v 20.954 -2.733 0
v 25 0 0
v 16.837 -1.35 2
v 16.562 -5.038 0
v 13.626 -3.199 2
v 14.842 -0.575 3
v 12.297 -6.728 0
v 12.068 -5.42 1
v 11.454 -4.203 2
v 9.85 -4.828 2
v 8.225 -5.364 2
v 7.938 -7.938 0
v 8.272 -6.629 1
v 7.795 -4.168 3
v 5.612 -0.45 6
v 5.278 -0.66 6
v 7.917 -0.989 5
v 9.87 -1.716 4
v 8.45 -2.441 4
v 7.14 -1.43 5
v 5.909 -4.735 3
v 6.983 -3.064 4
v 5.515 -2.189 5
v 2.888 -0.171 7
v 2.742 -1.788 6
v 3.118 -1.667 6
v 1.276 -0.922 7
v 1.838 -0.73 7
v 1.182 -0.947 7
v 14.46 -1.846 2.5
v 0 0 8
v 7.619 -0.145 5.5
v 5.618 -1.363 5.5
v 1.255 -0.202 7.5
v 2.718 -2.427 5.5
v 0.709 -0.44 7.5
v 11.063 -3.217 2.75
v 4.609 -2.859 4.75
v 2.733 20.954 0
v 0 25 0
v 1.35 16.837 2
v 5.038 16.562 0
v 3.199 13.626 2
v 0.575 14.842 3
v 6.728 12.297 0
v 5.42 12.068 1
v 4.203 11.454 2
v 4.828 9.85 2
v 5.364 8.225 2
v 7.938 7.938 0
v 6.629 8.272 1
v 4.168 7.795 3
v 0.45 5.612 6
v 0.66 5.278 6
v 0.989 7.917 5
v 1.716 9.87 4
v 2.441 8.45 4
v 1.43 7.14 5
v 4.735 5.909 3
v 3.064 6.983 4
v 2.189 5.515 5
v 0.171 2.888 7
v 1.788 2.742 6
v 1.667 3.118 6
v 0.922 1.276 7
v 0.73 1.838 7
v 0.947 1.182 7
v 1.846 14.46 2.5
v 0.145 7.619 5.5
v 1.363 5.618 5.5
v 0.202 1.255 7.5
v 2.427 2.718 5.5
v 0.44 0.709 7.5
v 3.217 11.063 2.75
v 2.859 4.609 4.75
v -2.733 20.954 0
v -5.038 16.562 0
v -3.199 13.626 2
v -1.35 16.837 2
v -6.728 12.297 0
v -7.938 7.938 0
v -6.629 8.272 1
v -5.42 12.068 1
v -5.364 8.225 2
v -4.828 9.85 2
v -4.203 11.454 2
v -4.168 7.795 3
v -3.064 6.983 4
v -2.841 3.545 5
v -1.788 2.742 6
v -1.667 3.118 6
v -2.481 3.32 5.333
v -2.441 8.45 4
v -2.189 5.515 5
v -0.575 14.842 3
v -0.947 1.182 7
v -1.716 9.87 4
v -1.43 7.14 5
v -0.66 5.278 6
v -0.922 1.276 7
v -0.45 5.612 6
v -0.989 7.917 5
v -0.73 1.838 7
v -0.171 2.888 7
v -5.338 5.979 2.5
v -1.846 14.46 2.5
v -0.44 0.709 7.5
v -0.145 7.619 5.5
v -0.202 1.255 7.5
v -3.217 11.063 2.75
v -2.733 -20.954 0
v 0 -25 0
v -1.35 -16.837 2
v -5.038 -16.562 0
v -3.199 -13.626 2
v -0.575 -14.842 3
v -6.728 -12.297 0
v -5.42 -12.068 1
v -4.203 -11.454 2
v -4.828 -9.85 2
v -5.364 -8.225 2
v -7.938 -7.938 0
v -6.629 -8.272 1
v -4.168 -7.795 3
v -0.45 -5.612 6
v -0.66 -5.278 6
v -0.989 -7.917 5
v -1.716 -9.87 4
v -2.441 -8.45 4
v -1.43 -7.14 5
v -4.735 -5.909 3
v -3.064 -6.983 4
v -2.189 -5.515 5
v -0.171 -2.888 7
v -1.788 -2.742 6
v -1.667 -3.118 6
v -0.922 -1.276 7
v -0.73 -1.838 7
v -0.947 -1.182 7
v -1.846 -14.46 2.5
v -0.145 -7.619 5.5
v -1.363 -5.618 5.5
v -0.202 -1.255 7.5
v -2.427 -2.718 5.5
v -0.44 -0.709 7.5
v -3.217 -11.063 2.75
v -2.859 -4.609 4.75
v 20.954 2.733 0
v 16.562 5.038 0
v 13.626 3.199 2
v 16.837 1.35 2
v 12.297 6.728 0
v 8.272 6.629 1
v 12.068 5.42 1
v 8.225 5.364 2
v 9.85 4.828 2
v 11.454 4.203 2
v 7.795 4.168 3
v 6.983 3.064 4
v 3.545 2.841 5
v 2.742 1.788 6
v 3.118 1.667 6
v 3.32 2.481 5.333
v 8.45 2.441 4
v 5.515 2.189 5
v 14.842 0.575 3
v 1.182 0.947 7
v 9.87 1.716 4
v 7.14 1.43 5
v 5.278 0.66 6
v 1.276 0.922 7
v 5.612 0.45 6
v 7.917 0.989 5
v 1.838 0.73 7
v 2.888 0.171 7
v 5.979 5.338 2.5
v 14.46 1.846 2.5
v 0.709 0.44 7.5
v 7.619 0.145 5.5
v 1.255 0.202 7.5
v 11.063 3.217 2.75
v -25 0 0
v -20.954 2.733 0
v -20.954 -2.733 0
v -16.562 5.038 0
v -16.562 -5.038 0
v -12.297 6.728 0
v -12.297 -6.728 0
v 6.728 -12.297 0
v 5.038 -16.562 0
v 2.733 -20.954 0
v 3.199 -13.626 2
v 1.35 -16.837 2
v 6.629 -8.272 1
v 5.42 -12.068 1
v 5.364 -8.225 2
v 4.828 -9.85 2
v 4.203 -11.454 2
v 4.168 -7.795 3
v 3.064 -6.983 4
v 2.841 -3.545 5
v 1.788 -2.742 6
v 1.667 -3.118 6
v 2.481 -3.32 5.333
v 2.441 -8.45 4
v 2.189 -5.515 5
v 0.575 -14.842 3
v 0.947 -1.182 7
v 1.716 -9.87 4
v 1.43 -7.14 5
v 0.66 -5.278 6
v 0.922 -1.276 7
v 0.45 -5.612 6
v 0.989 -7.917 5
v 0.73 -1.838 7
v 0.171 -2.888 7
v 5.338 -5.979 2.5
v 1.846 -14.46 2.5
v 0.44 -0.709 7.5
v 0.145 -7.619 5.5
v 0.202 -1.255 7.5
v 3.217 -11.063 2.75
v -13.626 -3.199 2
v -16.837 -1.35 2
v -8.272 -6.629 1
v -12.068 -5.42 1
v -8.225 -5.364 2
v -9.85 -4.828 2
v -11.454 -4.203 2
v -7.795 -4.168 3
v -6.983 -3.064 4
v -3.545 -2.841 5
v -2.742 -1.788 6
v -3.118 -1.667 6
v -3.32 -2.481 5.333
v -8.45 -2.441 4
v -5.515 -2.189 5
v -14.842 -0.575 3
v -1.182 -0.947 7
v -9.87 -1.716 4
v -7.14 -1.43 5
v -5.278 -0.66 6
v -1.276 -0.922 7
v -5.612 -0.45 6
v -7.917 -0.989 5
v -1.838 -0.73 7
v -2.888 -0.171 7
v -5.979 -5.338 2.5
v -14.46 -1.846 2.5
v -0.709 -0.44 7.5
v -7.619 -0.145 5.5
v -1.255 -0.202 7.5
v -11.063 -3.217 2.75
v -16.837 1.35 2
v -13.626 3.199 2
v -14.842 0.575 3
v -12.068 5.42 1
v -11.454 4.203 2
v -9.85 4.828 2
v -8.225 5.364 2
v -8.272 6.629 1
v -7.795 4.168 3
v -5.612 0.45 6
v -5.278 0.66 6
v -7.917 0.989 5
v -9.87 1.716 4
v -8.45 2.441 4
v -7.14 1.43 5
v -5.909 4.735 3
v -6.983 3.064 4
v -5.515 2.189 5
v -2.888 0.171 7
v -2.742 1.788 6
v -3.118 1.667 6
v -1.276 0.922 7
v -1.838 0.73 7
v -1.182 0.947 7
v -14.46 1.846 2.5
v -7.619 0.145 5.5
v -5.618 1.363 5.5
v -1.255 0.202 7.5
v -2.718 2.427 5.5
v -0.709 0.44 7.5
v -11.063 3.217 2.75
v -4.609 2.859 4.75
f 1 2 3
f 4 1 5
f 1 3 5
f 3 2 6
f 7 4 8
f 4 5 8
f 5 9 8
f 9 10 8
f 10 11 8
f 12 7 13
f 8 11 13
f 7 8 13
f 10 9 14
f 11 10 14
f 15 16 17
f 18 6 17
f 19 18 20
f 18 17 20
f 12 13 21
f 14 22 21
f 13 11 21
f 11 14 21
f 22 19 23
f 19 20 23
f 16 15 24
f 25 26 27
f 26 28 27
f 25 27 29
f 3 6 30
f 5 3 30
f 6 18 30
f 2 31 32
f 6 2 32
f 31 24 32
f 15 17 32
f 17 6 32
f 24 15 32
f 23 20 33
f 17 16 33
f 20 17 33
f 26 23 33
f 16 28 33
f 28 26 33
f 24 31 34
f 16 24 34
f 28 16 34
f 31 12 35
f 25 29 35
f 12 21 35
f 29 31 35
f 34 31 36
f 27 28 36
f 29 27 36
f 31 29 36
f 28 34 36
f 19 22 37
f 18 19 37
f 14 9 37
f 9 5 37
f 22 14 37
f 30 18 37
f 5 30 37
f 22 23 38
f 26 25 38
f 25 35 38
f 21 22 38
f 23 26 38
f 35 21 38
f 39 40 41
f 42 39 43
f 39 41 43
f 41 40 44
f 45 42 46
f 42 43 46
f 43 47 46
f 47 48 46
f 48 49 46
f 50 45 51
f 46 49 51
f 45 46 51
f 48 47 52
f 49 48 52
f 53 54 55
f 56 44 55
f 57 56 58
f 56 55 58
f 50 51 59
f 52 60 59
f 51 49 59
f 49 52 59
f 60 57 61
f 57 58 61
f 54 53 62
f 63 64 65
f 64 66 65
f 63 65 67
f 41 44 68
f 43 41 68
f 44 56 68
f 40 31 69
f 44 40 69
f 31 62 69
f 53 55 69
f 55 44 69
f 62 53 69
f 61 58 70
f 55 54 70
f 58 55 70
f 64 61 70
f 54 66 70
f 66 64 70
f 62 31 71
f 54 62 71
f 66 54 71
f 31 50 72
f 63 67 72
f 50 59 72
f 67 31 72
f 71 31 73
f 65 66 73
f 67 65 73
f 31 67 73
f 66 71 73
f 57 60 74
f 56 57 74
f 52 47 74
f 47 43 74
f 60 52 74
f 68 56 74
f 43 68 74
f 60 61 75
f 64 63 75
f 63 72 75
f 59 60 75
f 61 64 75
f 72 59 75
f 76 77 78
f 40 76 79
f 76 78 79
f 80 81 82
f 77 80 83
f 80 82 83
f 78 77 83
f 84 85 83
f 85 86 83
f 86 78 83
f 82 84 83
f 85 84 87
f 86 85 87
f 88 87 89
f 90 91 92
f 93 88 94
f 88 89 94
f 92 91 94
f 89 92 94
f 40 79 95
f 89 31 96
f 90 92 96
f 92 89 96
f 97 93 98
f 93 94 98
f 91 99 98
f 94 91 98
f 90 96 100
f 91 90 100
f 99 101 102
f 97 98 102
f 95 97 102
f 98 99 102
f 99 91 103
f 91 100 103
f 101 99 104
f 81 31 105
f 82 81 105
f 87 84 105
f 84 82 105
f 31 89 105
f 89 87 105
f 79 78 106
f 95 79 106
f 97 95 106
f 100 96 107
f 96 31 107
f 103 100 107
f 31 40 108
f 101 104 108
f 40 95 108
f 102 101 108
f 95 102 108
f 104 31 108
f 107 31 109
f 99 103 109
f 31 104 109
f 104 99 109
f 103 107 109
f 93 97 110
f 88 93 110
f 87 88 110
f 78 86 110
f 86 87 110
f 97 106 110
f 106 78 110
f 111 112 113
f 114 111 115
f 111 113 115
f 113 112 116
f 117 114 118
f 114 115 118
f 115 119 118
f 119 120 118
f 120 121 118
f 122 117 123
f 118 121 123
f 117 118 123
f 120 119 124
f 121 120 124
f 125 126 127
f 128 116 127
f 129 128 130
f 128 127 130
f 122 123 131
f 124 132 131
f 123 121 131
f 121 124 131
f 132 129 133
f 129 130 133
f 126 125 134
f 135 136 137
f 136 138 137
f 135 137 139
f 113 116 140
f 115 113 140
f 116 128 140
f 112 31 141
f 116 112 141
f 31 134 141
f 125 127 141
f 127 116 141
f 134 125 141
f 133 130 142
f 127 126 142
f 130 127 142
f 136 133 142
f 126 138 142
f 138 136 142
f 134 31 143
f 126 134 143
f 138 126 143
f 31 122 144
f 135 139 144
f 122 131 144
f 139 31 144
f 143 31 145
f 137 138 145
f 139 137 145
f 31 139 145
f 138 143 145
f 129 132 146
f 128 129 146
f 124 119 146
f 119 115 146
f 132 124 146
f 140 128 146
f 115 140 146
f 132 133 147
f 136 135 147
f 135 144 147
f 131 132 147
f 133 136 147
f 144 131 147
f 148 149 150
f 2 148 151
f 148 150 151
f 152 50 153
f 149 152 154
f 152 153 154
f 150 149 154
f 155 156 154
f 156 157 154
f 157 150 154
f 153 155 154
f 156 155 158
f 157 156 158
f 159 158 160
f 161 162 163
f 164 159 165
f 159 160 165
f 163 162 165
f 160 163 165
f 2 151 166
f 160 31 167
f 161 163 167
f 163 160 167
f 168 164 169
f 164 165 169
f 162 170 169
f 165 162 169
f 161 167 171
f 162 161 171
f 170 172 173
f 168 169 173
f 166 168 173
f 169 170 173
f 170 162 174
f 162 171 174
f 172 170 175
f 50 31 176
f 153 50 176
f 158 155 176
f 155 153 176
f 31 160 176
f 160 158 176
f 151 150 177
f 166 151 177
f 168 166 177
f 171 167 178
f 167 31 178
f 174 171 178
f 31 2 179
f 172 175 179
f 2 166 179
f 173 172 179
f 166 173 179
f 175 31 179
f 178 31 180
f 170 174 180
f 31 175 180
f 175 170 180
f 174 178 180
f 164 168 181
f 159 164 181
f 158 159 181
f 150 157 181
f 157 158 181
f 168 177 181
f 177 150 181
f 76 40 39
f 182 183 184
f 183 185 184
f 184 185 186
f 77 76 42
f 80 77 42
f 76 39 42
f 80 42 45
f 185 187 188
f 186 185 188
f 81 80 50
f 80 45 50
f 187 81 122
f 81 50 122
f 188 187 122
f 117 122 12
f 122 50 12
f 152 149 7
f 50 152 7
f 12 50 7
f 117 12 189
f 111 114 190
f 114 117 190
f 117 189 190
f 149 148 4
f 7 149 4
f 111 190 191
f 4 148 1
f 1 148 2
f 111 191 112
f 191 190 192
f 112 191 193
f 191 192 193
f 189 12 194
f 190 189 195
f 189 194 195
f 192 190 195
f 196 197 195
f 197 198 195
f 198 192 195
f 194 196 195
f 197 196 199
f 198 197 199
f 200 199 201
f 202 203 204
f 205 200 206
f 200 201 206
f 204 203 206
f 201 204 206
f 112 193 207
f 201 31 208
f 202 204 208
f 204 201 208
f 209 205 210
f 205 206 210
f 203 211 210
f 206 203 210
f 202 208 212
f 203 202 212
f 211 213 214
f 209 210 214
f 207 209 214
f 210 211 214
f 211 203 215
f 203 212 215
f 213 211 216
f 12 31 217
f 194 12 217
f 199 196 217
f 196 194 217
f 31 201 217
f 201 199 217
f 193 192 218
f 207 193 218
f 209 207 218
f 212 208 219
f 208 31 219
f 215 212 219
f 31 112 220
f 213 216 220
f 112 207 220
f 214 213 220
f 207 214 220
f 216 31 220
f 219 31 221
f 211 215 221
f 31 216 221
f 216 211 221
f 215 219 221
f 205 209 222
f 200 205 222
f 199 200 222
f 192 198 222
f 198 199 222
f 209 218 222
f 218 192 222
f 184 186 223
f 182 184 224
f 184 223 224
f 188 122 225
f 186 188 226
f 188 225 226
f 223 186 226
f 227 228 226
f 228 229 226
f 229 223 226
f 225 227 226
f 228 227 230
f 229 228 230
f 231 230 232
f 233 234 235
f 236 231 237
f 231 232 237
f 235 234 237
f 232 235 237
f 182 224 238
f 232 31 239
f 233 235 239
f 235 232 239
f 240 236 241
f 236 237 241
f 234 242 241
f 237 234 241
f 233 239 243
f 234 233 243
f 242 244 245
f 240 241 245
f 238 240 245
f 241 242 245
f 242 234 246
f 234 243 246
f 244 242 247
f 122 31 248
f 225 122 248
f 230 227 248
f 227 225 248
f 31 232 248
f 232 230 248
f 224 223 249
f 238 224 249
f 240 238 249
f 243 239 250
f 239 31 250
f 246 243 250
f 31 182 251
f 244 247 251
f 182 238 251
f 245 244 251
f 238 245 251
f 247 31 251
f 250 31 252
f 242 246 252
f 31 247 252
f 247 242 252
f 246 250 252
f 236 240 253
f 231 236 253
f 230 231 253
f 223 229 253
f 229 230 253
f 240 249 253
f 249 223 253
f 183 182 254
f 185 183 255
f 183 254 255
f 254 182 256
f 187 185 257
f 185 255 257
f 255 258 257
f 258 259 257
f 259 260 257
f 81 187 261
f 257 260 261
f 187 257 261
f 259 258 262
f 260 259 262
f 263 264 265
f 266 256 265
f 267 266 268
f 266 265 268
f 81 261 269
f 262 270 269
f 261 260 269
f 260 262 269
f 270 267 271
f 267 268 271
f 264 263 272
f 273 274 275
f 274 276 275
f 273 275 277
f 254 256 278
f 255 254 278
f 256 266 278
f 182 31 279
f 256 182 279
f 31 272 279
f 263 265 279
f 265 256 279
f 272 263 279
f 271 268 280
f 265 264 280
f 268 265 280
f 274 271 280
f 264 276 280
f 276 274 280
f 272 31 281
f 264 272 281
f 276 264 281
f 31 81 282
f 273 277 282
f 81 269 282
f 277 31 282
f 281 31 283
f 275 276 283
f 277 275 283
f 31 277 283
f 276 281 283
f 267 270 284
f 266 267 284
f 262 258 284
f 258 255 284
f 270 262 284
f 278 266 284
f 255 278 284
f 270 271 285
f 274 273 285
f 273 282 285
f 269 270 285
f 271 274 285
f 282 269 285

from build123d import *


with BuildPart() as f4:
    # F1 (on Top) → F4 section 0
    with BuildSketch(Plane.XY, mode=Mode.PRIVATE) as f4_s0:
        with BuildLine():
            add(Edge.make_bspline(
                [(0, 25), (3.75286, 20.08172), (6.619529, 14.005937), (7.937671, 7.937671)],
                knots=[0, 0, 0, 0, 18.818334, 18.818334, 18.818334, 18.818334], degree=3))
            add(Edge.make_bspline(
                [(0, 25), (-3.75286, 20.08172), (-6.619529, 14.005937), (-7.937671, 7.937671)],
                knots=[0, 0, 0, 0, 18.818334, 18.818334, 18.818334, 18.818334], degree=3))
            add(Edge.make_bspline(
                [(-25, 0), (-20.08172, 3.75286), (-14.005937, 6.619529), (-7.937671, 7.937671)],
                knots=[0, 0, 0, 0, 18.818334, 18.818334, 18.818334, 18.818334], degree=3))
            add(Edge.make_bspline(
                [(-25, 0), (-20.08172, -3.75286), (-14.005937, -6.619529), (-7.937671, -7.937671)],
                knots=[0, 0, 0, 0, 18.818334, 18.818334, 18.818334, 18.818334], degree=3))
            add(Edge.make_bspline(
                [(0, -25), (-3.75286, -20.08172), (-6.619529, -14.005937), (-7.937671, -7.937671)],
                knots=[0, 0, 0, 0, 18.818334, 18.818334, 18.818334, 18.818334], degree=3))
            add(Edge.make_bspline(
                [(0, -25), (3.75286, -20.08172), (6.619529, -14.005937), (7.937671, -7.937671)],
                knots=[0, 0, 0, 0, 18.818334, 18.818334, 18.818334, 18.818334], degree=3))
            add(Edge.make_bspline(
                [(25, 0), (20.08172, -3.75286), (14.005937, -6.619529), (7.937671, -7.937671)],
                knots=[0, 0, 0, 0, 18.818334, 18.818334, 18.818334, 18.818334], degree=3))
            add(Edge.make_bspline(
                [(25, 0), (20.08172, 3.75286), (14.005937, 6.619529), (7.937671, 7.937671)],
                knots=[0, 0, 0, 0, 18.818334, 18.818334, 18.818334, 18.818334], degree=3))
        make_face()
    loft([f4_s0.sketch, Vertex(0, 0, 8)])


solid = f4.part
